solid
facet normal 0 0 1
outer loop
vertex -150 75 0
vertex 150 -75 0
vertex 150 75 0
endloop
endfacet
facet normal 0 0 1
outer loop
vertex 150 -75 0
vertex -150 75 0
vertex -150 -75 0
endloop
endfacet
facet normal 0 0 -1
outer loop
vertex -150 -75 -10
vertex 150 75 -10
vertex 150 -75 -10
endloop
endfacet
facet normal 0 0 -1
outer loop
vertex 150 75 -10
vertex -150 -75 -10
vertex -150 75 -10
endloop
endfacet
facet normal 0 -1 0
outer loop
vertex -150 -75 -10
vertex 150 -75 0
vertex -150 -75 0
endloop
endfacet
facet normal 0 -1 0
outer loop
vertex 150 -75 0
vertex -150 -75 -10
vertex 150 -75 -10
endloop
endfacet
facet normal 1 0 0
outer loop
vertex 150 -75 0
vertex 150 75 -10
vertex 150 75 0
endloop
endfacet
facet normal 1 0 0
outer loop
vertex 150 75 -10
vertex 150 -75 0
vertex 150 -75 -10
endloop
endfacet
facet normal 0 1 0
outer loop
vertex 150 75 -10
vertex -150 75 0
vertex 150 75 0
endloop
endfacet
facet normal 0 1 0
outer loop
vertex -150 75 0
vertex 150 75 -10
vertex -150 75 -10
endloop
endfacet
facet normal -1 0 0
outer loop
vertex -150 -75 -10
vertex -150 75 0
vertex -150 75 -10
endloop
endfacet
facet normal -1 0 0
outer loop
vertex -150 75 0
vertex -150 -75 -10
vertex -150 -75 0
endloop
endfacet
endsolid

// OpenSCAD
$fn = 60;

table(300, 150, 10);

module table(size_x, size_y, thickness) {
    translate([0, 0, -thickness / 2])
    cube([size_x, size_y, thickness], center = true);
}
